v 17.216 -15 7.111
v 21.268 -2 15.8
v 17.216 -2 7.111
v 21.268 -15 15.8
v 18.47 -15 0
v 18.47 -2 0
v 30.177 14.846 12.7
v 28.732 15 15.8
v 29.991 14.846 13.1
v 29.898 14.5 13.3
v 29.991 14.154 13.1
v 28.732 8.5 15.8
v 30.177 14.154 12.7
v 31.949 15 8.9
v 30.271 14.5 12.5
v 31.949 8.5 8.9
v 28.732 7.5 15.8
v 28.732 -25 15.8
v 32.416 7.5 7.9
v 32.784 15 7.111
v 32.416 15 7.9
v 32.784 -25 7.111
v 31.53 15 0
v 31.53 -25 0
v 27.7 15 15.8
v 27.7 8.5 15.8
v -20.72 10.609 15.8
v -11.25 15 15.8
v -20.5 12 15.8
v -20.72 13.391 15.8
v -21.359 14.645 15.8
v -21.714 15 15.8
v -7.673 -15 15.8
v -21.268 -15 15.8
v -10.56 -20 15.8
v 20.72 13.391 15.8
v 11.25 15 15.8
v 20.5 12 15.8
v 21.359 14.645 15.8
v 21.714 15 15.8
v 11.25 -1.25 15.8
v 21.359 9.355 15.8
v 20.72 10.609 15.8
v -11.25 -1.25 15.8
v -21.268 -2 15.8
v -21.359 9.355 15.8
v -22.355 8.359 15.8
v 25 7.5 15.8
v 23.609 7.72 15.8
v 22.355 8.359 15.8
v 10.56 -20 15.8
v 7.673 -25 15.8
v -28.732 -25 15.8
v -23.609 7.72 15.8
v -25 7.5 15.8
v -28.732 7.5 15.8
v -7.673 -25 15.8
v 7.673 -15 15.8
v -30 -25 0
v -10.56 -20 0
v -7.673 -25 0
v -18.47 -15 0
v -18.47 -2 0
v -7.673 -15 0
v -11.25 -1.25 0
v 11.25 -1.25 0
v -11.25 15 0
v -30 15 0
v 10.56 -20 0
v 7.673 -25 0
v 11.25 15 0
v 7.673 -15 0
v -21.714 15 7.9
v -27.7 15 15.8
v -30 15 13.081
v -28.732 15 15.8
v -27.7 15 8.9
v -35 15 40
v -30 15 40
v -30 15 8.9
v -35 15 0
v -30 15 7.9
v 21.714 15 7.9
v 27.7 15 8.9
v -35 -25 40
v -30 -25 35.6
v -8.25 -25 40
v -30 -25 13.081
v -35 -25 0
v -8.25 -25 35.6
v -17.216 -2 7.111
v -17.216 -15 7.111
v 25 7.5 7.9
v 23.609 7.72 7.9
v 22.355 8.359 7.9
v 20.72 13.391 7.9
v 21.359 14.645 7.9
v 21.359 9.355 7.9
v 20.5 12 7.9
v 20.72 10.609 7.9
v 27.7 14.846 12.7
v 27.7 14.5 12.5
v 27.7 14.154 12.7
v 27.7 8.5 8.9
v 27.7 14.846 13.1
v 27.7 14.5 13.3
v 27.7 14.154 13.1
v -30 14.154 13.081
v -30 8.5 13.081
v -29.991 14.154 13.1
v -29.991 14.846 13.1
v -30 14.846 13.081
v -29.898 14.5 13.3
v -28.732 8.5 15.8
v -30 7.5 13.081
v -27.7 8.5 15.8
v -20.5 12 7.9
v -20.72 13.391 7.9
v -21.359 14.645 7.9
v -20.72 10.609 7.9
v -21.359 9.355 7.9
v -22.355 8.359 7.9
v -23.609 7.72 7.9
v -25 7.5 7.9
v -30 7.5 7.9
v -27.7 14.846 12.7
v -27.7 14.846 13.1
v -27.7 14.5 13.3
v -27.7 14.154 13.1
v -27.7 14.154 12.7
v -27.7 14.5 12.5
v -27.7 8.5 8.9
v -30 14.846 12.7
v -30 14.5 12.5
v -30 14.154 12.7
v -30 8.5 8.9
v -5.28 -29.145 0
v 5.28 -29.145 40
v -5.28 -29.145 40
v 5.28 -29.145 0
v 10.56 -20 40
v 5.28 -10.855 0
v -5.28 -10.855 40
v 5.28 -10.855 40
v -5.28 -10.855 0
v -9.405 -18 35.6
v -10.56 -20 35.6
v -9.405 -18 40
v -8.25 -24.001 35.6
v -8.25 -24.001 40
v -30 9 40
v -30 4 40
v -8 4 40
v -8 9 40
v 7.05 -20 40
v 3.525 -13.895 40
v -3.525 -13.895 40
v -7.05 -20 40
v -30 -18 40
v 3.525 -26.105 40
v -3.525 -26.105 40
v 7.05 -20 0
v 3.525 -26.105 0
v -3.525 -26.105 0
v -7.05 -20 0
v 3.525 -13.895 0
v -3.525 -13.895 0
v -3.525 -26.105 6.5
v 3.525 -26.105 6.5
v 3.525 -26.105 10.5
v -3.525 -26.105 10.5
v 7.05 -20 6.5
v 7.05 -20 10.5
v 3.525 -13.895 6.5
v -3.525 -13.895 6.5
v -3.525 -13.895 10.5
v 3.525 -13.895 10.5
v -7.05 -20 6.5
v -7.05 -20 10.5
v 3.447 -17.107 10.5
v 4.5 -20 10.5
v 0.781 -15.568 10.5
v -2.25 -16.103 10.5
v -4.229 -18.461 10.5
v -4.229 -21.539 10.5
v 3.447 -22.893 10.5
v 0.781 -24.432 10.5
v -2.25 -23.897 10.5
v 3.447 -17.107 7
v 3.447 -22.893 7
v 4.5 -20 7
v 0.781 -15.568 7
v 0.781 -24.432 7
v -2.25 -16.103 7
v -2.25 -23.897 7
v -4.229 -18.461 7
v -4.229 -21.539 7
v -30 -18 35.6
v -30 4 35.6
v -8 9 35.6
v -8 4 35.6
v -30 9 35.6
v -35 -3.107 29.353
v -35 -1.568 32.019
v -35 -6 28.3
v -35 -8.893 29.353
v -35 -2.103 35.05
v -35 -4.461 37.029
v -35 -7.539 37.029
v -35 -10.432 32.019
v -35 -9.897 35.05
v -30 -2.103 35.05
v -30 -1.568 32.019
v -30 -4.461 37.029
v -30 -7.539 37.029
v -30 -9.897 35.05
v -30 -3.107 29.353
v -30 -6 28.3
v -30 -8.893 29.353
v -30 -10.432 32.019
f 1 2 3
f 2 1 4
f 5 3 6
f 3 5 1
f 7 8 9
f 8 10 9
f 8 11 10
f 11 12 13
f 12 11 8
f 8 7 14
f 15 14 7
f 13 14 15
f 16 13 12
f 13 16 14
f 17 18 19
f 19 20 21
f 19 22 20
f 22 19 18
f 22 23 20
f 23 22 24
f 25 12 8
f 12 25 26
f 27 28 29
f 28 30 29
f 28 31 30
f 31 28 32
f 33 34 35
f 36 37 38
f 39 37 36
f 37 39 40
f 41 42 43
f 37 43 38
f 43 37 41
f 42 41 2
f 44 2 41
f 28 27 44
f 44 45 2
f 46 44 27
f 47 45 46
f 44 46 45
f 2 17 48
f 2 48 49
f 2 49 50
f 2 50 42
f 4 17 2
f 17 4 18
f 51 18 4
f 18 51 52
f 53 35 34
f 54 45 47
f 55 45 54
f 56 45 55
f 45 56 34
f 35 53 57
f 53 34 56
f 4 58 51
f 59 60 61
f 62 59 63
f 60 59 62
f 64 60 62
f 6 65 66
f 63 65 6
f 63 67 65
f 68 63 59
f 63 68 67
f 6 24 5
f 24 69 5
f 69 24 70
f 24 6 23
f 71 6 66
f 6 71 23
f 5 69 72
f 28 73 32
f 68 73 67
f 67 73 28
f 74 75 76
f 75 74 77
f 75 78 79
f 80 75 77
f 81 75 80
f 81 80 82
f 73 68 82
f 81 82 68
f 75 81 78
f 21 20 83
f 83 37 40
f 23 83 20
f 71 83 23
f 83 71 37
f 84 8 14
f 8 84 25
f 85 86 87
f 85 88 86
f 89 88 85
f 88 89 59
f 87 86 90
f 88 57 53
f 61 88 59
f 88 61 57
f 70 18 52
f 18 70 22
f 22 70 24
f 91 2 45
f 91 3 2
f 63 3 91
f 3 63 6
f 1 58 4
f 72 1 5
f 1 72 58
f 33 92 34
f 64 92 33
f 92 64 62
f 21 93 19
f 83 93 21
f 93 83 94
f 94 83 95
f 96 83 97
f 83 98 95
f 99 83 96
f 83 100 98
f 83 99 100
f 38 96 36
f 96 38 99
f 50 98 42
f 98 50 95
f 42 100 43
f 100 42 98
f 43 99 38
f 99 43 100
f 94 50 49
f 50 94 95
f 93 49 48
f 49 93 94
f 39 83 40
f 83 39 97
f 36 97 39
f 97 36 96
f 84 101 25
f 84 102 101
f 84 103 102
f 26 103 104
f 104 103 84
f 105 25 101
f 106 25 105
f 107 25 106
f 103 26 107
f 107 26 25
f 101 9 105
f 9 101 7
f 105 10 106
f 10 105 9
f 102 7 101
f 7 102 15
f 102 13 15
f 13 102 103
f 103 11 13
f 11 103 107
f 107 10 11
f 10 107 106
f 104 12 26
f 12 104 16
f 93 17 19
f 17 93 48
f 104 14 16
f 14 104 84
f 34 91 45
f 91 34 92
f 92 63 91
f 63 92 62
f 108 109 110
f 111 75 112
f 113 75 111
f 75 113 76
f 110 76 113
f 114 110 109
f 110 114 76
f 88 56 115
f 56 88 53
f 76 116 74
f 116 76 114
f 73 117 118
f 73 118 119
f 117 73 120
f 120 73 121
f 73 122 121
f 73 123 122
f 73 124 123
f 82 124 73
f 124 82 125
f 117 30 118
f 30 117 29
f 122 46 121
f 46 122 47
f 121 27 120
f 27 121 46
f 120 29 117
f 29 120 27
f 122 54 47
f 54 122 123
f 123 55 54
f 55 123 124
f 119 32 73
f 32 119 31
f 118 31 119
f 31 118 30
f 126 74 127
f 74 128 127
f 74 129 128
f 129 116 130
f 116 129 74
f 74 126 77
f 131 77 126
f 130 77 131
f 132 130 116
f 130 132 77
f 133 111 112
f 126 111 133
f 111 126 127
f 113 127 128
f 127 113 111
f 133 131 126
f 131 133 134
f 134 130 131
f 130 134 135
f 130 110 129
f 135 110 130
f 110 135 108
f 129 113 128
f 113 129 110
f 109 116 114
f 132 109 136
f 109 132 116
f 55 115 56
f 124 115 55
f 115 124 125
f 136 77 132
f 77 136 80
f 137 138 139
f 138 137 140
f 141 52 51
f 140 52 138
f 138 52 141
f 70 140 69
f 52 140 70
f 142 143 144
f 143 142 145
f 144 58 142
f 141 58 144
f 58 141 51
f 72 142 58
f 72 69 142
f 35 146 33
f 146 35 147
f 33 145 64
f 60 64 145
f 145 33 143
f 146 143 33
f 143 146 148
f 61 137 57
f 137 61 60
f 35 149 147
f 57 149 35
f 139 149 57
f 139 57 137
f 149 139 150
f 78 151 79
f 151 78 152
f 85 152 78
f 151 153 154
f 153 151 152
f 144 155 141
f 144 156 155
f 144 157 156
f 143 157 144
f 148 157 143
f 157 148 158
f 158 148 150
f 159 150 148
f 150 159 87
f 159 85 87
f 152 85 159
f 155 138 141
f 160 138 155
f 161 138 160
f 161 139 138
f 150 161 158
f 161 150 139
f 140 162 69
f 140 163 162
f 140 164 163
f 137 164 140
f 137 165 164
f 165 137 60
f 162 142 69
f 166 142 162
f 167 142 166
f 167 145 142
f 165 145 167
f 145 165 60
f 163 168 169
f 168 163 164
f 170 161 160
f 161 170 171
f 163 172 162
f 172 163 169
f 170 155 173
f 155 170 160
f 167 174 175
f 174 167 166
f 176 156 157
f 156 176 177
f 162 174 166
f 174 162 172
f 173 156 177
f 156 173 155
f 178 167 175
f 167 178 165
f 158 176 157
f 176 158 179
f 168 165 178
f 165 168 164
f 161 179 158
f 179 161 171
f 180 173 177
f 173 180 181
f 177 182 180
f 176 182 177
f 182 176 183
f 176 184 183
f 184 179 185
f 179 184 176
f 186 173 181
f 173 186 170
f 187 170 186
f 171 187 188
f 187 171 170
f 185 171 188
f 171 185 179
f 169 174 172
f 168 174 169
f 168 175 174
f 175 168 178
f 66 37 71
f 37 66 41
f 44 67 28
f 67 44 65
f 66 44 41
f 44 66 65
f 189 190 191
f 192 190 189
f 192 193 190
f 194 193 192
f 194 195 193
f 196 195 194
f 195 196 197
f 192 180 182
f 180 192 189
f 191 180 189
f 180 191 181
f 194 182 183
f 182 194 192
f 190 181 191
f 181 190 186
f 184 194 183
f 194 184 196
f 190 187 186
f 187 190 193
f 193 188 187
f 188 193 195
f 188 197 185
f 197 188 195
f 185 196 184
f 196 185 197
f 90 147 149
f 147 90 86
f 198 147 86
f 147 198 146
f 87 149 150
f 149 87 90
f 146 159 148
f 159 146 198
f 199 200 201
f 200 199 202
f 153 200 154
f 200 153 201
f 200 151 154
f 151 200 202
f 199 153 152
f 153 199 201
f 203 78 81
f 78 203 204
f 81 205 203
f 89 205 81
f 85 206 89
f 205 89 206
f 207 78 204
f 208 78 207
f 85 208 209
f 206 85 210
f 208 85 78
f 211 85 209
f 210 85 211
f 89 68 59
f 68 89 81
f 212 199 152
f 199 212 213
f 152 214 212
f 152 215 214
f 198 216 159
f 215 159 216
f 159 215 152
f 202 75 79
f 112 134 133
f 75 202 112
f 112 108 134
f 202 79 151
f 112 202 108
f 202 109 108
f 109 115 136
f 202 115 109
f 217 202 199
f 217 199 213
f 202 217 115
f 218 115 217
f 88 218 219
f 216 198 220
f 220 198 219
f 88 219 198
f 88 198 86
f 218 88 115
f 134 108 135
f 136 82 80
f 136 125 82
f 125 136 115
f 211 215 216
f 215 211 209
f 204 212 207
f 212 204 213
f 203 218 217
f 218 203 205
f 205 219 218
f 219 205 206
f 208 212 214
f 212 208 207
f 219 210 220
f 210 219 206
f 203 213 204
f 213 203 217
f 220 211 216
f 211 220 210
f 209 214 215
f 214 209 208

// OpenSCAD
// file: teardrop.scad
teardropcentering2();
padded_teardrop();

module teardrop (r=4.5,h=20, r_mult=1)
{
	union(){
		cylinder(r=r, h=h, $fn=20);
		teardrop_poly(r=r, h=h, r_mult=r_mult);
	}
}

module teardrop_poly (r=4.5,h=20, r_mult=1.2)
{
	linear_extrude(height=h)
	{
		polygon(points=[[0,0],[r*cos(30),r*sin(30)],[0.5*r,r_mult*r],[-0.5*r,r_mult*r],[-r*cos(30),r*sin(30)]],
				paths=[[0,1,2,3,4]]);
	}
}

module teardropcentering (r=4.5,h=20)
{
    {
		teardrop(r=r, h=h, r_mult=1.2);
	}
}

module teardropcentering2 (r=4.5,h=20)
{
	difference(){
        teardrop(r=r, h=h, r_mult=1.2);
	translate(v = [-1.5*r, -1.5*r,-1])cube(size =[3*r,1.5*r,h+2]);
	}
}

module padded_teardrop(r = 4, h = 15, diameter_adjust = 0.5, internal_offset = 0, pressure_pad_height_ratio=0.325, add_strenght = 1, cut_spacing = 5, cut_h=5.5, magic = 10, cut_width=1)
{

	//r is real radius, as measured on steel.
    // (real object has radius bigger by diameter_adjust
	//h is lenght of pressure pad, including cutouts.
	// (Real object has teardrop part enlarged by
    // magic number to positive direction and by internal_offset to negative direcion

	// you should not have to change to change latter
	//diameter_adjust is here due to wall width, or something like this.
	//pressure_pad_height_ratio is how far the pressure pad sticks into the rod hole

	//add_strenght enables 'cuts' to trick skeinforge into putting more plastic
	//  into pressure pad, greatly strenghtening it.
	//  set to 1 for cylindrical, 2 for slot cuts.
	//cut_spacing is distance between cuts. for cylindrical cuts every odd cut
	//  is offset by cut_spacing/2
	// cut_h is height of cuts, you should be able to fine tune it so it begins in object layer 2
	//magic is here to assure that when substracting we get out of the object
    //cut_width is distande between pressure pad and object

	//always substract just from nearest wrapping object

	difference(){
		//axe hole
        translate([0, 0, -internal_offset])
		  teardropcentering((r+diameter_adjust), h+magic+internal_offset);
		//pressure pad
		rotate([0,-90,90])
		translate([
			0,
			-(r+diameter_adjust),
			(-(r+diameter_adjust))-(r-(r*pressure_pad_height_ratio))-magic
			])
			cube(size = [
				h,
				(r+diameter_adjust)*2,(r+diameter_adjust)+magic]);
	}
	rotate([0,-90,90]) {
		//cutting along the axis
		//this one goes thru
		translate(v = [0, -(r+diameter_adjust), -(r+diameter_adjust)-magic])
			cube(size = [h,cut_width,(r+diameter_adjust)+magic]);
		//this one does not
		translate(v = [0, (r+diameter_adjust)-cut_width, -(r+diameter_adjust)])
			cube(size = [h,cut_width,(r+diameter_adjust)]);
		//cuts across axis, both go thru
		translate(v = [0, -(r+diameter_adjust), -(r+diameter_adjust)-magic])
			cube(size = [cut_width,(r+diameter_adjust)*2,(r+diameter_adjust)+magic]);
		translate(v = [h-cut_width, -(r+diameter_adjust), -(r+diameter_adjust)-magic])
			cube(size = [cut_width,(r+diameter_adjust)*2,(r+diameter_adjust)+magic]);

		if(add_strenght==1){
			//cylinder cut
			translate([cut_spacing,0,0]) {
				for (i=[1:h/cut_spacing]){
					translate(v = [(i-1)*cut_spacing, (r+diameter_adjust)-r/2, -(r+diameter_adjust)])
						cylinder(h = cut_h, r=0.4, $fn=6, center=true);
					translate(v = [(i-1)*cut_spacing- (cut_spacing/2) , (r+diameter_adjust)+r/2, -(r+diameter_adjust)])
						cylinder(h = cut_h, r=0.4, $fn=6, center=true);
				}
			}
		} 
		if (add_strenght == 2){
			//slot cut
			for (i=[1:h/cut_spacing]){
				translate(v = [i*cut_spacing, (r+diameter_adjust)-r/2, -(r+diameter_adjust)-cut_h/2])
					cube([0.4,r,cut_h]); 
			}
		}
	}
}
// file: bushing.scad
// PRUSA Mendel  
// Bushings
// GNU GPL v3
// Josef Průša
// josefprusa@me.com
// prusadjs.cz
// http://www.reprap.org/wiki/Prusa_Mendel
// http://github.com/prusajr/PrusaMendel

include <configuration.scad>

/**
 * @id bushing
 * @name Bushing
 * @category Printed
 * @id bushing
 */ 



module bushing(stiff, lenght=11){
	difference(){
		union(){
			translate(v=[-7.5,-8,0])cube(size = [15,8,lenght]);
			cylinder(h = lenght, r=7.5);
		}
	//cutout inside
	//Opening
	rotate(a=[0,0,45]) translate(v=[1,1,-1]) cube(size = [16,16,lenght+2]);
	//Cutouts to make it more bendy
	if(stiff){
		translate(v=[-4.8,-6,-1]) cube(size = [0.8,6,lenght+2]);
		translate(v=[4,-6,-1]) cube(size = [0.8,6,lenght+2]);
	}else{
		translate(v=[-4.8,-8,-1]) cube(size = [0.8,8,lenght+2]);
		translate(v=[4,-8,-1]) cube(size = [0.8,8,lenght+2]);
	}
	translate(v=[0,5,(lenght+2)/2]) cube(size = [7,8,lenght+2], center=true);
	translate(v=[0,0,-1]) cylinder(h = lenght+2, r=5);
	}
}


module standart_bushing(){

difference(){translate(v=[0,5,8])rotate(a=[90,0,0]){
bushing(false, 10);
translate(v=[-7,-13,0])cube(size = [14,5,10]);
translate(v=[-2,-13,-3])cube(size = [4,5,16]);
translate(v=[-2,-12,-3])cube(size = [4,7.5,2]);
translate(v=[-2,-12,11])cube(size = [4,7.5,2]);
}
translate(v=[-3,-1,-16])rotate(a=[45,0,0])cube(size = [6,5,16]);

mirror([ 0, 1, 0 ]) translate(v=[-3,-1,-16])rotate(a=[45,0,0])cube(size = [6,5,16]);}
}


// Includes small cutouts for better prints
module vertical_bushing(stiff, lenght){
difference(){
bushing(stiff, lenght);
translate(v=[-5,0,-1]) cube(size = [10,2.5,lenght+2]);
}
}


//vertical_bushing(true, 11);

module z_bushings(){
// STUFF FOR X-ENDS
difference(){
// Slider.
translate([0,6.5,30]) 
cube([23,17,60],center=true);
// Slider cutout.
translate([0,10,32.5]) 
cube([17,17,70],center=true);
}
union(){translate([0,9.5,0])vertical_bushing(true,13);
	//translate([0,4,0.5])cube(size = [8,2,1], center = true);
	//translate([0,4,12.5])cube(size = [8,2,1], center = true);
	translate([0,9.5,48])vertical_bushing(true,13);
	//translate([0,4,48+0.5])cube(size = [8,2,1], center = true);
	//translate([0,4,48+12.5])cube(size = [8,2,1], center = true);
	translate([0,9.5,32])
	{
		difference()
		{
			bushing(true,16);
			translate([0,3,2]) 
			rotate([45,0,0])
			cube([16,30,16], center=true);
		}
	}
}
}


// Linear bushing options


lm8uu_diameter=(lme8uu==true) ? 16 : 15;
lm8uu_length=(lme8uu==true) ? 25 : 24;
lm8uu_radius = lm8uu_diameter / 2;
block_height = 2*lm8uu_length+17;



//z_bushings();
//
//linear_holder_base(60);
//cut_corners(true, false, true, false); 

module cut_corners(lf,lb,rf,rb){
	difference(){
	lm8uu_bearing_holder();
	if(lf) translate(v=[(10)-3,(-28.5/2)+3,0]) rotate(a=[0,0,45]) rotate(a=[35,0,0]) translate(v=[0,-5,0]) cube(size = [20,10,20], center = true);
	if(lb)translate(v=[(-10)+3,(-28.5/2)+3,0]) rotate(a=[0,0,-45]) rotate(a=[35,0,0]) translate(v=[0,-5,0]) cube(size = [20,10,20], center = true);
	mirror([ 0, 1, 0 ]){
	if(rf)translate(v=[(10)-3,(-28.5/2)+3,0]) rotate(a=[0,0,45]) rotate(a=[35,0,0]) translate(v=[0,-5,0]) cube(size = [20,10,20], center = true);
	if(rb)translate(v=[(-10)+3,(-28.5/2)+3,0]) rotate(a=[0,0,-45]) rotate(a=[35,0,0]) translate(v=[0,-5,0]) cube(size = [20,10,20], center = true);
	}
}
//lm8uu_bearing_holder();
}

module linear_holder_base(length){
	
difference(){
union(){
//main block
//translate(v=[-(lm8uu_radius+2.5)/2,0,block_height/2]) cube(size = [lm8uu_radius+2.5,lm8uu_diameter+5,block_height], center = true);
translate(v=[-5,0,length/2]) cube(size = [10,20,length], center = true);

//holder for main block in x-end
// leaving it out now
//translate(v=[0,0,0]) cylinder(h = length, r=10, $fn=60);

//translate(v=[-5,0,15.8/2]) cube(size = [12,23,15.8], center = true);
//translate(v=[0,0,0]) cylinder(h = block_height, r=lm8uu_radius+2.5, $fn=60);
}
//main axis
translate(v=[0,0,-2]) cylinder(h = length+4, r=(lm8uu_diameter+0.8)/2, $fn=50);
// not needed for zip tie
//main cut
//translate(v=[10,0,length/2]) cube(size = [20,14,length+4], center = true);
//smooth entry cut
//translate(v=[12,0,length/2]) rotate(a=[0,0,45]) cube(size = [20,20,length+4], center = true);
}
}


module y_linear_bearings(){
	difference(){
		union(){
translate(v=[0,0,1.5]) cube(size = [26,14,3], center = true);
translate(v=[-13,0,0])rotate(a=[0,0,30])cylinder(h = 3, r=7, $fn=6);
translate(v=[13,0,0])rotate(a=[0,0,30])cylinder(h = 3, r=7, $fn=6); 
}


translate(v=[-14,0,0])polyhole(m3_diameter, 10);
translate(v=[14,0,0])polyhole(m3_diameter, 10);
//hack
translate(v=[0,14.25,4.5]) rotate(a=[90,0,0]) translate(v=[0,9.5,0]) rotate(a=[0,0,90]){
	translate(v=[0,0,lm8uu_length/2+0.5]) ziptie();
}
}

cut_corners(true, true, true, true); 


 
}

lm8uu_holder_length = lm8uu_length+4.5;
lm8uu_holder_width= lm8uu_diameter+5;

module lm8uu_bearing_holder(){
translate(v=[0,14.25,4.5])rotate(a=[90,0,0])translate(v=[0,9.5,0]) rotate(a=[0,0,90]){

difference(){
	union(){
		linear_holder_base(lm8uu_length+4.5);
		translate(v=[-10-2,0,lm8uu_holder_length/2]) cube(size = [4,20,lm8uu_holder_length], center = true);
	}
	translate(v=[0,0,12.5]) ziptie();
}


translate(v=[-(10-5.5)/2-5.5,0,0.75]) cube(size = [10-5.5,20,1.5], center = true);
#translate(v=[-(10-5.5)/2-5.5,0,lm8uu_length+3.75]) cube(size = [10-5.5,20,1.5], center = true);

}
}

module lm8uu_bearing_cut()
	{
		translate([-lm8uu_holder_width/2,-lm8uu_holder_length/2,-5])cube([lm8uu_holder_width,lm8uu_holder_length,20]);
	}


module z_linear_bearings(){
translate(v=[0,9.5,0]) rotate(a=[0,0,90]){
difference(){
linear_holder_base(65);

translate(v=[0,0,14.5+2]) ziptie();
translate(v=[0,0,block_height-(12+2)-5]) ziptie();
}

//x-end adapter
difference(){
translate(v=[-6,0,15.8/2]) cube(size = [10,23,15.8], center = true);
translate(v=[0,0,-2]) cylinder(h = 20, r=7.9, $fn=50);
}


translate(v=[-(10-5.5)/2-lm8uu_radius+2,0,0+1]) cube(size = [10-5.5,20,2], center = true);
translate(v=[-(10-5.5)/2-lm8uu_radius+2,0,lm8uu_length+4.0]) cube(size = [10-5.5,20,2], center = true);
translate(v=[-(10-5.5)/2-lm8uu_radius+2,0,64-lm8uu_length-3]) cube(size = [10-5.5,20,2], center = true);
translate(v=[-(10-5.5)/2-lm8uu_radius+2,0,64]) cube(size = [10-5.5,20,2], center = true);
}
}

module ziptie(){
difference(){
translate(v=[0,0,0]) cylinder(h = 3.9, r=lm8uu_diameter);
translate(v=[0,0,0]) cylinder(h = 5, r=lm8uu_diameter-3, $fn=50);
translate(v=[0,0,3]) cylinder(h = 1, r1=lm8uu_diameter-3, r2=lm8uu_diameter, $fn=50);
}}
// file: functions.scad
// PRUSA Mendel  
// Functions used in many files
// GNU GPL v2
// Josef Průša
// josefprusa@me.com
// prusadjs.cz
// http://www.reprap.org/wiki/Prusa_Mendel
// http://github.com/prusajr/PrusaMendel

module nut(d,h,horizontal=true){
cornerdiameter =  (d / 2) / cos (180 / 6);
cylinder(h = h, r = cornerdiameter, $fn = 6);
if(horizontal){
for(i = [1:6]){
	rotate([0,0,60*i]) translate([-cornerdiameter-0.2,0,0]) rotate([0,0,-45]) cube(size = [2,2,h]);
}}
}

// By nophead
module polyhole(d,h) {
    n = max(round(2 * d),3);
    rotate([0,0,180])
        cylinder(h = h, r = (d / 2) / cos (180 / n), $fn = n);
}




module roundcorner(diameter){
	difference(){
		cube(size = [diameter,diameter,99], center = false);
		translate(v = [diameter, diameter, 0]) cylinder(h = 100, r=diameter, center=true);
	}
}
// file: metric.scad
// PRUSA Mendel  
// Default metric sizes
// GNU GPL v3
// Josef Průša
// josefprusa@me.com
// prusadjs.cz
// http://www.reprap.org/wiki/Prusa_Mendel
// http://github.com/prusajr/PrusaMendel

// DONT CHANGE THIS FILE! ALTER VALUES IN CONFIGURATION.SCAD INSTEAD

// RODS

threaded_rod_diameter = 8.7;
threaded_rod_diameter_horizontal = 8.7;
smooth_bar_diameter = 8;
smooth_bar_diameter_horizontal = 8.5;

// Nuts and bolts

m8_diameter = 9;
m8_nut_diameter = 14.1;

m4_diameter = 4.5;
m4_nut_diameter = 9;

m3_diameter = 3.6;
m3_nut_diameter = 5.5;
m3_nut_diameter_horizontal = 6.1;

// Bushing holder

bushing_core_diameter = smooth_bar_diameter;
bushing_material_thickness = 1;

// Motors

motor_shaft = 5.5;
// file: x-end.scad
// PRUSA Mendel  
// X-end prototype for
// GNU GPL v2
// Josef Prusa
// josefprusa@me.com
// prusadjs.cz
// http://www.reprap.org/wiki/Prusa_Mendel
// http://github.com/prusajr/PrusaMendel
// Thanks to GregFrost for refactoring!

include <configuration.scad>
corection = 1.17; 
use <bushing.scad>
use <teardrop.scad>

axis_diameter_real=4;
axis_diameter_larger=4.5;
pressure_pad_height=1.4;
add_strenght=1;
xend_height=15.8;
xend_length=40;
solid_end_width=3;
slot_width=1;

pad_height=5.2;
pad_width=7;
pad_connector_height=3.3;
bushing_support_width=17;
rod_support_width=10;

module xend_side(closed_end=true,curved_sides=false)
{
	translate([25,0,0])
	difference ()
	{
		union()
		{
			if (curved_sides)
			{
				for (i=[0:1])
				rotate(90) 
				rotate([180*i,0,0])
				teardrop(r=xend_height/2,h=xend_length);
			}
			else
			{
				difference ()
				{
					translate([0,xend_length/2,0])
					cube([xend_height,xend_length,xend_height],center=true);
	
					for (i=[0:1])
					translate([0,xend_length/2,0])
					rotate(i*180)
					{
					translate([-12,0,2]) 
					rotate([0,25,0]) 
					cube([10,xend_length+2,20],center=true);

					translate([-13,0,0]) rotate(a=[0,-10,0]) 
					cube([10,xend_length+2,20],center=true);
					}

//					mirror() translate(v = [-12,0,2]) rotate(a=[0,25,0]) translate(v = [0,-3.5,0]) 
//					cube(size = [10,13,20], center = true);


//					mirror() translate(v = [-13,0,]) rotate(a=[0,-10,0]) 
//					translate(v = [0,-3.5,0]) 
//					cube(size = [10,13,20], center = true);
				}
			}

			translate([-26,xend_length-bushing_support_width,-xend_height/2])
			cube([26,bushing_support_width,xend_height]);

			translate([-26,0,-xend_height/2])
			cube([26,rod_support_width,xend_height]);
		}

		difference ()
		{
			union ()
			{
			translate([0,xend_length-3,0])
			rotate(-90,0, 0)
//			teardropcentering(
			padded_teardrop(
				r=axis_diameter_real,
				h=xend_length-6,
				internal_offset=closed_end?0:10
				);

			}


		}

	}
}
//xend_side();
module xend(closed_end=true)
{
	
	if(linear==1) z_linear_bearings();
	if(linear==0) z_bushings();	
difference()
	{
		union ()
		{
			translate(v = [0,-25,xend_height/2])
			{
				xend_side(closed_end=closed_end,curved_sides=0);
				mirror([1,0,0]) xend_side(closed_end=closed_end,curved_sides=0);
			}	


			//Nut Trap
			translate([0,-20,0]) //
			cylinder(h=40,r=m8_nut_diameter/2+thin_wall*corection,$fn=6);
		}

		// Slider cutout.
		translate([0,10,32.5]) 
		cube([22.5,22.5,70],center=true);

		//Rod hole.
		difference()
		{
			translate([0,-20,39.5]) 
			cylinder(h=90,r=m8_nut_diameter/2,$fn=6,center=true);
			translate([0,-20,8.5]) 
			cylinder(h=4,r=m8_nut_diameter/2+thin_wall,$fn=6,center=true);
		}
		translate([0,-20,52]) 
		cylinder(h=90,r=m8_diameter/2,$fn=9,center=true);
	}
}

module xendcorners(dia1, dia2, dia3, dia4, height=0)
{
	translate(v = [0,35,24.5]) 
	union()
	{ 
		//round corners
		translate(v = [33.1, -60.1, -25]) rotate(a=[0,0,90]) roundcorner(dia1);
		translate(v = [33.1, -19.9, -25]) rotate(a=[0,0,-180]) roundcorner(dia2);
		translate(v = [-33.1,-60.1,-25]) rotate(a=[0,0,0]) roundcorner(dia3);
		translate(v = [-33.1, -19.9, -25]) rotate(a=[0,0,-90]) roundcorner(dia4);
	}
}
//xendcorners(5,5,5,5,0);
//difference(){
xend(true);
//translate(v = [15, -40, 0]) cube(size = [20,100,20]);

//translate(v = [-15-20, -40, 0]) cube(size = [20,100,20]);

//translate(v = [-50, -45, 0]) cube(size = [100,40,100]);
//}
//xend_side();
// file: configuration.scad
// PRUSA Mendel  
// Configuration file
// GNU GPL v3
// Josef Průša
// josefprusa@me.com
// prusadjs.cz
// http://www.reprap.org/wiki/Prusa_Mendel
// http://github.com/prusajr/PrusaMendel

// PLEASE SELECT ONE OF THE CONFIGURATIONS BELOW
// BY UN-COMMENTING IT

// Uncomment for metric settings
// METRIC METRIC METRIC METRIC METRIC METRIC METRIC METRIC 

include <metric.scad>;

// CUSTOM CUSTOM CUSTOM CUSTOM CUSTOM CUSTOM CUSTOM CUSTOM CUSTOM

thin_wall = 3;

// LM8UU
linear = true;


// CHANGE ONLY THE STUFF YOU KNOW
// IT WILL REPLACE DEFAULT SETTING

// RODS

// threaded_rod_diameter = 0;
// threaded_rod_diameter_horizontal = 0;
// smooth_bar_díameter = 0;
// smooth_bar_díameter_horizontal = 0;

// Nuts and bolts

// m8_diameter = 0;
// m8_nut_diameter = 0;

// m4_diameter = 0;
// m4_nut_diameter = 0;

// m3_diameter = 0;
// m3_nut_diameter = 0;

// Bushing holder

// bushing_core_diameter = smooth_bar_díameter;
// bushing_material_thickness = 0;


///counted stuff
m3_nut_diameter_bigger = ((m3_nut_diameter  / 2) / cos (180 / 6))*2;

// functions 
include <functions.scad>
// main file
// PRUSA Mendel  
// X-end with idler mount
// GNU GPL v3
// Josef Průša
// josefprusa@me.com
// prusadjs.cz
// http://www.reprap.org/wiki/Prusa_Mendel
// http://github.com/prusajr/PrusaMendel

include <configuration.scad>
corection = 1.17; 

/**
 * @id x-end-idler
 * @name X end idler
 * @category Printed
 * @using 1 m8spring
 * @using 3 m8nut
 * @using 3 m8washer
 * @using 3 m8washer-big
 * @using 2 m8x30
 */ 
use <x-end.scad>
support_beam_offset=(linear==true) ? 6:0;

module xendidler(linear){

	xend(true,linear);
	translate(v = [0, 0, 12.5]){
		mirror(){
			difference(){
				union(){
					translate(v = [21, -21.5, 25.3]) cube(size = [25.5,7,4.4], center = true);
					
					translate(v = [20, 12.5-support_beam_offset, 25.3]) cube(size = [24,5,4.4], center = true);
					translate(v = [32.5, -5, 7.5]) cube(size = [5,40,40], center = true);
				}
				translate(v = [32.5, -6, 28-3-4.7]) rotate(a=[0,90,0]) cylinder(h = 90, r=m8_diameter/2, $fn=9, center=true);
			}
		}
	}
	translate([-5,-30,0])scale([2,1,2]) rotate(a=[90,0,0]) linear_extrude(file = "this-way-up.dxf", layer = "r",
  height = 2, center = true, convexity = 10);
}
xendidler(linear);
